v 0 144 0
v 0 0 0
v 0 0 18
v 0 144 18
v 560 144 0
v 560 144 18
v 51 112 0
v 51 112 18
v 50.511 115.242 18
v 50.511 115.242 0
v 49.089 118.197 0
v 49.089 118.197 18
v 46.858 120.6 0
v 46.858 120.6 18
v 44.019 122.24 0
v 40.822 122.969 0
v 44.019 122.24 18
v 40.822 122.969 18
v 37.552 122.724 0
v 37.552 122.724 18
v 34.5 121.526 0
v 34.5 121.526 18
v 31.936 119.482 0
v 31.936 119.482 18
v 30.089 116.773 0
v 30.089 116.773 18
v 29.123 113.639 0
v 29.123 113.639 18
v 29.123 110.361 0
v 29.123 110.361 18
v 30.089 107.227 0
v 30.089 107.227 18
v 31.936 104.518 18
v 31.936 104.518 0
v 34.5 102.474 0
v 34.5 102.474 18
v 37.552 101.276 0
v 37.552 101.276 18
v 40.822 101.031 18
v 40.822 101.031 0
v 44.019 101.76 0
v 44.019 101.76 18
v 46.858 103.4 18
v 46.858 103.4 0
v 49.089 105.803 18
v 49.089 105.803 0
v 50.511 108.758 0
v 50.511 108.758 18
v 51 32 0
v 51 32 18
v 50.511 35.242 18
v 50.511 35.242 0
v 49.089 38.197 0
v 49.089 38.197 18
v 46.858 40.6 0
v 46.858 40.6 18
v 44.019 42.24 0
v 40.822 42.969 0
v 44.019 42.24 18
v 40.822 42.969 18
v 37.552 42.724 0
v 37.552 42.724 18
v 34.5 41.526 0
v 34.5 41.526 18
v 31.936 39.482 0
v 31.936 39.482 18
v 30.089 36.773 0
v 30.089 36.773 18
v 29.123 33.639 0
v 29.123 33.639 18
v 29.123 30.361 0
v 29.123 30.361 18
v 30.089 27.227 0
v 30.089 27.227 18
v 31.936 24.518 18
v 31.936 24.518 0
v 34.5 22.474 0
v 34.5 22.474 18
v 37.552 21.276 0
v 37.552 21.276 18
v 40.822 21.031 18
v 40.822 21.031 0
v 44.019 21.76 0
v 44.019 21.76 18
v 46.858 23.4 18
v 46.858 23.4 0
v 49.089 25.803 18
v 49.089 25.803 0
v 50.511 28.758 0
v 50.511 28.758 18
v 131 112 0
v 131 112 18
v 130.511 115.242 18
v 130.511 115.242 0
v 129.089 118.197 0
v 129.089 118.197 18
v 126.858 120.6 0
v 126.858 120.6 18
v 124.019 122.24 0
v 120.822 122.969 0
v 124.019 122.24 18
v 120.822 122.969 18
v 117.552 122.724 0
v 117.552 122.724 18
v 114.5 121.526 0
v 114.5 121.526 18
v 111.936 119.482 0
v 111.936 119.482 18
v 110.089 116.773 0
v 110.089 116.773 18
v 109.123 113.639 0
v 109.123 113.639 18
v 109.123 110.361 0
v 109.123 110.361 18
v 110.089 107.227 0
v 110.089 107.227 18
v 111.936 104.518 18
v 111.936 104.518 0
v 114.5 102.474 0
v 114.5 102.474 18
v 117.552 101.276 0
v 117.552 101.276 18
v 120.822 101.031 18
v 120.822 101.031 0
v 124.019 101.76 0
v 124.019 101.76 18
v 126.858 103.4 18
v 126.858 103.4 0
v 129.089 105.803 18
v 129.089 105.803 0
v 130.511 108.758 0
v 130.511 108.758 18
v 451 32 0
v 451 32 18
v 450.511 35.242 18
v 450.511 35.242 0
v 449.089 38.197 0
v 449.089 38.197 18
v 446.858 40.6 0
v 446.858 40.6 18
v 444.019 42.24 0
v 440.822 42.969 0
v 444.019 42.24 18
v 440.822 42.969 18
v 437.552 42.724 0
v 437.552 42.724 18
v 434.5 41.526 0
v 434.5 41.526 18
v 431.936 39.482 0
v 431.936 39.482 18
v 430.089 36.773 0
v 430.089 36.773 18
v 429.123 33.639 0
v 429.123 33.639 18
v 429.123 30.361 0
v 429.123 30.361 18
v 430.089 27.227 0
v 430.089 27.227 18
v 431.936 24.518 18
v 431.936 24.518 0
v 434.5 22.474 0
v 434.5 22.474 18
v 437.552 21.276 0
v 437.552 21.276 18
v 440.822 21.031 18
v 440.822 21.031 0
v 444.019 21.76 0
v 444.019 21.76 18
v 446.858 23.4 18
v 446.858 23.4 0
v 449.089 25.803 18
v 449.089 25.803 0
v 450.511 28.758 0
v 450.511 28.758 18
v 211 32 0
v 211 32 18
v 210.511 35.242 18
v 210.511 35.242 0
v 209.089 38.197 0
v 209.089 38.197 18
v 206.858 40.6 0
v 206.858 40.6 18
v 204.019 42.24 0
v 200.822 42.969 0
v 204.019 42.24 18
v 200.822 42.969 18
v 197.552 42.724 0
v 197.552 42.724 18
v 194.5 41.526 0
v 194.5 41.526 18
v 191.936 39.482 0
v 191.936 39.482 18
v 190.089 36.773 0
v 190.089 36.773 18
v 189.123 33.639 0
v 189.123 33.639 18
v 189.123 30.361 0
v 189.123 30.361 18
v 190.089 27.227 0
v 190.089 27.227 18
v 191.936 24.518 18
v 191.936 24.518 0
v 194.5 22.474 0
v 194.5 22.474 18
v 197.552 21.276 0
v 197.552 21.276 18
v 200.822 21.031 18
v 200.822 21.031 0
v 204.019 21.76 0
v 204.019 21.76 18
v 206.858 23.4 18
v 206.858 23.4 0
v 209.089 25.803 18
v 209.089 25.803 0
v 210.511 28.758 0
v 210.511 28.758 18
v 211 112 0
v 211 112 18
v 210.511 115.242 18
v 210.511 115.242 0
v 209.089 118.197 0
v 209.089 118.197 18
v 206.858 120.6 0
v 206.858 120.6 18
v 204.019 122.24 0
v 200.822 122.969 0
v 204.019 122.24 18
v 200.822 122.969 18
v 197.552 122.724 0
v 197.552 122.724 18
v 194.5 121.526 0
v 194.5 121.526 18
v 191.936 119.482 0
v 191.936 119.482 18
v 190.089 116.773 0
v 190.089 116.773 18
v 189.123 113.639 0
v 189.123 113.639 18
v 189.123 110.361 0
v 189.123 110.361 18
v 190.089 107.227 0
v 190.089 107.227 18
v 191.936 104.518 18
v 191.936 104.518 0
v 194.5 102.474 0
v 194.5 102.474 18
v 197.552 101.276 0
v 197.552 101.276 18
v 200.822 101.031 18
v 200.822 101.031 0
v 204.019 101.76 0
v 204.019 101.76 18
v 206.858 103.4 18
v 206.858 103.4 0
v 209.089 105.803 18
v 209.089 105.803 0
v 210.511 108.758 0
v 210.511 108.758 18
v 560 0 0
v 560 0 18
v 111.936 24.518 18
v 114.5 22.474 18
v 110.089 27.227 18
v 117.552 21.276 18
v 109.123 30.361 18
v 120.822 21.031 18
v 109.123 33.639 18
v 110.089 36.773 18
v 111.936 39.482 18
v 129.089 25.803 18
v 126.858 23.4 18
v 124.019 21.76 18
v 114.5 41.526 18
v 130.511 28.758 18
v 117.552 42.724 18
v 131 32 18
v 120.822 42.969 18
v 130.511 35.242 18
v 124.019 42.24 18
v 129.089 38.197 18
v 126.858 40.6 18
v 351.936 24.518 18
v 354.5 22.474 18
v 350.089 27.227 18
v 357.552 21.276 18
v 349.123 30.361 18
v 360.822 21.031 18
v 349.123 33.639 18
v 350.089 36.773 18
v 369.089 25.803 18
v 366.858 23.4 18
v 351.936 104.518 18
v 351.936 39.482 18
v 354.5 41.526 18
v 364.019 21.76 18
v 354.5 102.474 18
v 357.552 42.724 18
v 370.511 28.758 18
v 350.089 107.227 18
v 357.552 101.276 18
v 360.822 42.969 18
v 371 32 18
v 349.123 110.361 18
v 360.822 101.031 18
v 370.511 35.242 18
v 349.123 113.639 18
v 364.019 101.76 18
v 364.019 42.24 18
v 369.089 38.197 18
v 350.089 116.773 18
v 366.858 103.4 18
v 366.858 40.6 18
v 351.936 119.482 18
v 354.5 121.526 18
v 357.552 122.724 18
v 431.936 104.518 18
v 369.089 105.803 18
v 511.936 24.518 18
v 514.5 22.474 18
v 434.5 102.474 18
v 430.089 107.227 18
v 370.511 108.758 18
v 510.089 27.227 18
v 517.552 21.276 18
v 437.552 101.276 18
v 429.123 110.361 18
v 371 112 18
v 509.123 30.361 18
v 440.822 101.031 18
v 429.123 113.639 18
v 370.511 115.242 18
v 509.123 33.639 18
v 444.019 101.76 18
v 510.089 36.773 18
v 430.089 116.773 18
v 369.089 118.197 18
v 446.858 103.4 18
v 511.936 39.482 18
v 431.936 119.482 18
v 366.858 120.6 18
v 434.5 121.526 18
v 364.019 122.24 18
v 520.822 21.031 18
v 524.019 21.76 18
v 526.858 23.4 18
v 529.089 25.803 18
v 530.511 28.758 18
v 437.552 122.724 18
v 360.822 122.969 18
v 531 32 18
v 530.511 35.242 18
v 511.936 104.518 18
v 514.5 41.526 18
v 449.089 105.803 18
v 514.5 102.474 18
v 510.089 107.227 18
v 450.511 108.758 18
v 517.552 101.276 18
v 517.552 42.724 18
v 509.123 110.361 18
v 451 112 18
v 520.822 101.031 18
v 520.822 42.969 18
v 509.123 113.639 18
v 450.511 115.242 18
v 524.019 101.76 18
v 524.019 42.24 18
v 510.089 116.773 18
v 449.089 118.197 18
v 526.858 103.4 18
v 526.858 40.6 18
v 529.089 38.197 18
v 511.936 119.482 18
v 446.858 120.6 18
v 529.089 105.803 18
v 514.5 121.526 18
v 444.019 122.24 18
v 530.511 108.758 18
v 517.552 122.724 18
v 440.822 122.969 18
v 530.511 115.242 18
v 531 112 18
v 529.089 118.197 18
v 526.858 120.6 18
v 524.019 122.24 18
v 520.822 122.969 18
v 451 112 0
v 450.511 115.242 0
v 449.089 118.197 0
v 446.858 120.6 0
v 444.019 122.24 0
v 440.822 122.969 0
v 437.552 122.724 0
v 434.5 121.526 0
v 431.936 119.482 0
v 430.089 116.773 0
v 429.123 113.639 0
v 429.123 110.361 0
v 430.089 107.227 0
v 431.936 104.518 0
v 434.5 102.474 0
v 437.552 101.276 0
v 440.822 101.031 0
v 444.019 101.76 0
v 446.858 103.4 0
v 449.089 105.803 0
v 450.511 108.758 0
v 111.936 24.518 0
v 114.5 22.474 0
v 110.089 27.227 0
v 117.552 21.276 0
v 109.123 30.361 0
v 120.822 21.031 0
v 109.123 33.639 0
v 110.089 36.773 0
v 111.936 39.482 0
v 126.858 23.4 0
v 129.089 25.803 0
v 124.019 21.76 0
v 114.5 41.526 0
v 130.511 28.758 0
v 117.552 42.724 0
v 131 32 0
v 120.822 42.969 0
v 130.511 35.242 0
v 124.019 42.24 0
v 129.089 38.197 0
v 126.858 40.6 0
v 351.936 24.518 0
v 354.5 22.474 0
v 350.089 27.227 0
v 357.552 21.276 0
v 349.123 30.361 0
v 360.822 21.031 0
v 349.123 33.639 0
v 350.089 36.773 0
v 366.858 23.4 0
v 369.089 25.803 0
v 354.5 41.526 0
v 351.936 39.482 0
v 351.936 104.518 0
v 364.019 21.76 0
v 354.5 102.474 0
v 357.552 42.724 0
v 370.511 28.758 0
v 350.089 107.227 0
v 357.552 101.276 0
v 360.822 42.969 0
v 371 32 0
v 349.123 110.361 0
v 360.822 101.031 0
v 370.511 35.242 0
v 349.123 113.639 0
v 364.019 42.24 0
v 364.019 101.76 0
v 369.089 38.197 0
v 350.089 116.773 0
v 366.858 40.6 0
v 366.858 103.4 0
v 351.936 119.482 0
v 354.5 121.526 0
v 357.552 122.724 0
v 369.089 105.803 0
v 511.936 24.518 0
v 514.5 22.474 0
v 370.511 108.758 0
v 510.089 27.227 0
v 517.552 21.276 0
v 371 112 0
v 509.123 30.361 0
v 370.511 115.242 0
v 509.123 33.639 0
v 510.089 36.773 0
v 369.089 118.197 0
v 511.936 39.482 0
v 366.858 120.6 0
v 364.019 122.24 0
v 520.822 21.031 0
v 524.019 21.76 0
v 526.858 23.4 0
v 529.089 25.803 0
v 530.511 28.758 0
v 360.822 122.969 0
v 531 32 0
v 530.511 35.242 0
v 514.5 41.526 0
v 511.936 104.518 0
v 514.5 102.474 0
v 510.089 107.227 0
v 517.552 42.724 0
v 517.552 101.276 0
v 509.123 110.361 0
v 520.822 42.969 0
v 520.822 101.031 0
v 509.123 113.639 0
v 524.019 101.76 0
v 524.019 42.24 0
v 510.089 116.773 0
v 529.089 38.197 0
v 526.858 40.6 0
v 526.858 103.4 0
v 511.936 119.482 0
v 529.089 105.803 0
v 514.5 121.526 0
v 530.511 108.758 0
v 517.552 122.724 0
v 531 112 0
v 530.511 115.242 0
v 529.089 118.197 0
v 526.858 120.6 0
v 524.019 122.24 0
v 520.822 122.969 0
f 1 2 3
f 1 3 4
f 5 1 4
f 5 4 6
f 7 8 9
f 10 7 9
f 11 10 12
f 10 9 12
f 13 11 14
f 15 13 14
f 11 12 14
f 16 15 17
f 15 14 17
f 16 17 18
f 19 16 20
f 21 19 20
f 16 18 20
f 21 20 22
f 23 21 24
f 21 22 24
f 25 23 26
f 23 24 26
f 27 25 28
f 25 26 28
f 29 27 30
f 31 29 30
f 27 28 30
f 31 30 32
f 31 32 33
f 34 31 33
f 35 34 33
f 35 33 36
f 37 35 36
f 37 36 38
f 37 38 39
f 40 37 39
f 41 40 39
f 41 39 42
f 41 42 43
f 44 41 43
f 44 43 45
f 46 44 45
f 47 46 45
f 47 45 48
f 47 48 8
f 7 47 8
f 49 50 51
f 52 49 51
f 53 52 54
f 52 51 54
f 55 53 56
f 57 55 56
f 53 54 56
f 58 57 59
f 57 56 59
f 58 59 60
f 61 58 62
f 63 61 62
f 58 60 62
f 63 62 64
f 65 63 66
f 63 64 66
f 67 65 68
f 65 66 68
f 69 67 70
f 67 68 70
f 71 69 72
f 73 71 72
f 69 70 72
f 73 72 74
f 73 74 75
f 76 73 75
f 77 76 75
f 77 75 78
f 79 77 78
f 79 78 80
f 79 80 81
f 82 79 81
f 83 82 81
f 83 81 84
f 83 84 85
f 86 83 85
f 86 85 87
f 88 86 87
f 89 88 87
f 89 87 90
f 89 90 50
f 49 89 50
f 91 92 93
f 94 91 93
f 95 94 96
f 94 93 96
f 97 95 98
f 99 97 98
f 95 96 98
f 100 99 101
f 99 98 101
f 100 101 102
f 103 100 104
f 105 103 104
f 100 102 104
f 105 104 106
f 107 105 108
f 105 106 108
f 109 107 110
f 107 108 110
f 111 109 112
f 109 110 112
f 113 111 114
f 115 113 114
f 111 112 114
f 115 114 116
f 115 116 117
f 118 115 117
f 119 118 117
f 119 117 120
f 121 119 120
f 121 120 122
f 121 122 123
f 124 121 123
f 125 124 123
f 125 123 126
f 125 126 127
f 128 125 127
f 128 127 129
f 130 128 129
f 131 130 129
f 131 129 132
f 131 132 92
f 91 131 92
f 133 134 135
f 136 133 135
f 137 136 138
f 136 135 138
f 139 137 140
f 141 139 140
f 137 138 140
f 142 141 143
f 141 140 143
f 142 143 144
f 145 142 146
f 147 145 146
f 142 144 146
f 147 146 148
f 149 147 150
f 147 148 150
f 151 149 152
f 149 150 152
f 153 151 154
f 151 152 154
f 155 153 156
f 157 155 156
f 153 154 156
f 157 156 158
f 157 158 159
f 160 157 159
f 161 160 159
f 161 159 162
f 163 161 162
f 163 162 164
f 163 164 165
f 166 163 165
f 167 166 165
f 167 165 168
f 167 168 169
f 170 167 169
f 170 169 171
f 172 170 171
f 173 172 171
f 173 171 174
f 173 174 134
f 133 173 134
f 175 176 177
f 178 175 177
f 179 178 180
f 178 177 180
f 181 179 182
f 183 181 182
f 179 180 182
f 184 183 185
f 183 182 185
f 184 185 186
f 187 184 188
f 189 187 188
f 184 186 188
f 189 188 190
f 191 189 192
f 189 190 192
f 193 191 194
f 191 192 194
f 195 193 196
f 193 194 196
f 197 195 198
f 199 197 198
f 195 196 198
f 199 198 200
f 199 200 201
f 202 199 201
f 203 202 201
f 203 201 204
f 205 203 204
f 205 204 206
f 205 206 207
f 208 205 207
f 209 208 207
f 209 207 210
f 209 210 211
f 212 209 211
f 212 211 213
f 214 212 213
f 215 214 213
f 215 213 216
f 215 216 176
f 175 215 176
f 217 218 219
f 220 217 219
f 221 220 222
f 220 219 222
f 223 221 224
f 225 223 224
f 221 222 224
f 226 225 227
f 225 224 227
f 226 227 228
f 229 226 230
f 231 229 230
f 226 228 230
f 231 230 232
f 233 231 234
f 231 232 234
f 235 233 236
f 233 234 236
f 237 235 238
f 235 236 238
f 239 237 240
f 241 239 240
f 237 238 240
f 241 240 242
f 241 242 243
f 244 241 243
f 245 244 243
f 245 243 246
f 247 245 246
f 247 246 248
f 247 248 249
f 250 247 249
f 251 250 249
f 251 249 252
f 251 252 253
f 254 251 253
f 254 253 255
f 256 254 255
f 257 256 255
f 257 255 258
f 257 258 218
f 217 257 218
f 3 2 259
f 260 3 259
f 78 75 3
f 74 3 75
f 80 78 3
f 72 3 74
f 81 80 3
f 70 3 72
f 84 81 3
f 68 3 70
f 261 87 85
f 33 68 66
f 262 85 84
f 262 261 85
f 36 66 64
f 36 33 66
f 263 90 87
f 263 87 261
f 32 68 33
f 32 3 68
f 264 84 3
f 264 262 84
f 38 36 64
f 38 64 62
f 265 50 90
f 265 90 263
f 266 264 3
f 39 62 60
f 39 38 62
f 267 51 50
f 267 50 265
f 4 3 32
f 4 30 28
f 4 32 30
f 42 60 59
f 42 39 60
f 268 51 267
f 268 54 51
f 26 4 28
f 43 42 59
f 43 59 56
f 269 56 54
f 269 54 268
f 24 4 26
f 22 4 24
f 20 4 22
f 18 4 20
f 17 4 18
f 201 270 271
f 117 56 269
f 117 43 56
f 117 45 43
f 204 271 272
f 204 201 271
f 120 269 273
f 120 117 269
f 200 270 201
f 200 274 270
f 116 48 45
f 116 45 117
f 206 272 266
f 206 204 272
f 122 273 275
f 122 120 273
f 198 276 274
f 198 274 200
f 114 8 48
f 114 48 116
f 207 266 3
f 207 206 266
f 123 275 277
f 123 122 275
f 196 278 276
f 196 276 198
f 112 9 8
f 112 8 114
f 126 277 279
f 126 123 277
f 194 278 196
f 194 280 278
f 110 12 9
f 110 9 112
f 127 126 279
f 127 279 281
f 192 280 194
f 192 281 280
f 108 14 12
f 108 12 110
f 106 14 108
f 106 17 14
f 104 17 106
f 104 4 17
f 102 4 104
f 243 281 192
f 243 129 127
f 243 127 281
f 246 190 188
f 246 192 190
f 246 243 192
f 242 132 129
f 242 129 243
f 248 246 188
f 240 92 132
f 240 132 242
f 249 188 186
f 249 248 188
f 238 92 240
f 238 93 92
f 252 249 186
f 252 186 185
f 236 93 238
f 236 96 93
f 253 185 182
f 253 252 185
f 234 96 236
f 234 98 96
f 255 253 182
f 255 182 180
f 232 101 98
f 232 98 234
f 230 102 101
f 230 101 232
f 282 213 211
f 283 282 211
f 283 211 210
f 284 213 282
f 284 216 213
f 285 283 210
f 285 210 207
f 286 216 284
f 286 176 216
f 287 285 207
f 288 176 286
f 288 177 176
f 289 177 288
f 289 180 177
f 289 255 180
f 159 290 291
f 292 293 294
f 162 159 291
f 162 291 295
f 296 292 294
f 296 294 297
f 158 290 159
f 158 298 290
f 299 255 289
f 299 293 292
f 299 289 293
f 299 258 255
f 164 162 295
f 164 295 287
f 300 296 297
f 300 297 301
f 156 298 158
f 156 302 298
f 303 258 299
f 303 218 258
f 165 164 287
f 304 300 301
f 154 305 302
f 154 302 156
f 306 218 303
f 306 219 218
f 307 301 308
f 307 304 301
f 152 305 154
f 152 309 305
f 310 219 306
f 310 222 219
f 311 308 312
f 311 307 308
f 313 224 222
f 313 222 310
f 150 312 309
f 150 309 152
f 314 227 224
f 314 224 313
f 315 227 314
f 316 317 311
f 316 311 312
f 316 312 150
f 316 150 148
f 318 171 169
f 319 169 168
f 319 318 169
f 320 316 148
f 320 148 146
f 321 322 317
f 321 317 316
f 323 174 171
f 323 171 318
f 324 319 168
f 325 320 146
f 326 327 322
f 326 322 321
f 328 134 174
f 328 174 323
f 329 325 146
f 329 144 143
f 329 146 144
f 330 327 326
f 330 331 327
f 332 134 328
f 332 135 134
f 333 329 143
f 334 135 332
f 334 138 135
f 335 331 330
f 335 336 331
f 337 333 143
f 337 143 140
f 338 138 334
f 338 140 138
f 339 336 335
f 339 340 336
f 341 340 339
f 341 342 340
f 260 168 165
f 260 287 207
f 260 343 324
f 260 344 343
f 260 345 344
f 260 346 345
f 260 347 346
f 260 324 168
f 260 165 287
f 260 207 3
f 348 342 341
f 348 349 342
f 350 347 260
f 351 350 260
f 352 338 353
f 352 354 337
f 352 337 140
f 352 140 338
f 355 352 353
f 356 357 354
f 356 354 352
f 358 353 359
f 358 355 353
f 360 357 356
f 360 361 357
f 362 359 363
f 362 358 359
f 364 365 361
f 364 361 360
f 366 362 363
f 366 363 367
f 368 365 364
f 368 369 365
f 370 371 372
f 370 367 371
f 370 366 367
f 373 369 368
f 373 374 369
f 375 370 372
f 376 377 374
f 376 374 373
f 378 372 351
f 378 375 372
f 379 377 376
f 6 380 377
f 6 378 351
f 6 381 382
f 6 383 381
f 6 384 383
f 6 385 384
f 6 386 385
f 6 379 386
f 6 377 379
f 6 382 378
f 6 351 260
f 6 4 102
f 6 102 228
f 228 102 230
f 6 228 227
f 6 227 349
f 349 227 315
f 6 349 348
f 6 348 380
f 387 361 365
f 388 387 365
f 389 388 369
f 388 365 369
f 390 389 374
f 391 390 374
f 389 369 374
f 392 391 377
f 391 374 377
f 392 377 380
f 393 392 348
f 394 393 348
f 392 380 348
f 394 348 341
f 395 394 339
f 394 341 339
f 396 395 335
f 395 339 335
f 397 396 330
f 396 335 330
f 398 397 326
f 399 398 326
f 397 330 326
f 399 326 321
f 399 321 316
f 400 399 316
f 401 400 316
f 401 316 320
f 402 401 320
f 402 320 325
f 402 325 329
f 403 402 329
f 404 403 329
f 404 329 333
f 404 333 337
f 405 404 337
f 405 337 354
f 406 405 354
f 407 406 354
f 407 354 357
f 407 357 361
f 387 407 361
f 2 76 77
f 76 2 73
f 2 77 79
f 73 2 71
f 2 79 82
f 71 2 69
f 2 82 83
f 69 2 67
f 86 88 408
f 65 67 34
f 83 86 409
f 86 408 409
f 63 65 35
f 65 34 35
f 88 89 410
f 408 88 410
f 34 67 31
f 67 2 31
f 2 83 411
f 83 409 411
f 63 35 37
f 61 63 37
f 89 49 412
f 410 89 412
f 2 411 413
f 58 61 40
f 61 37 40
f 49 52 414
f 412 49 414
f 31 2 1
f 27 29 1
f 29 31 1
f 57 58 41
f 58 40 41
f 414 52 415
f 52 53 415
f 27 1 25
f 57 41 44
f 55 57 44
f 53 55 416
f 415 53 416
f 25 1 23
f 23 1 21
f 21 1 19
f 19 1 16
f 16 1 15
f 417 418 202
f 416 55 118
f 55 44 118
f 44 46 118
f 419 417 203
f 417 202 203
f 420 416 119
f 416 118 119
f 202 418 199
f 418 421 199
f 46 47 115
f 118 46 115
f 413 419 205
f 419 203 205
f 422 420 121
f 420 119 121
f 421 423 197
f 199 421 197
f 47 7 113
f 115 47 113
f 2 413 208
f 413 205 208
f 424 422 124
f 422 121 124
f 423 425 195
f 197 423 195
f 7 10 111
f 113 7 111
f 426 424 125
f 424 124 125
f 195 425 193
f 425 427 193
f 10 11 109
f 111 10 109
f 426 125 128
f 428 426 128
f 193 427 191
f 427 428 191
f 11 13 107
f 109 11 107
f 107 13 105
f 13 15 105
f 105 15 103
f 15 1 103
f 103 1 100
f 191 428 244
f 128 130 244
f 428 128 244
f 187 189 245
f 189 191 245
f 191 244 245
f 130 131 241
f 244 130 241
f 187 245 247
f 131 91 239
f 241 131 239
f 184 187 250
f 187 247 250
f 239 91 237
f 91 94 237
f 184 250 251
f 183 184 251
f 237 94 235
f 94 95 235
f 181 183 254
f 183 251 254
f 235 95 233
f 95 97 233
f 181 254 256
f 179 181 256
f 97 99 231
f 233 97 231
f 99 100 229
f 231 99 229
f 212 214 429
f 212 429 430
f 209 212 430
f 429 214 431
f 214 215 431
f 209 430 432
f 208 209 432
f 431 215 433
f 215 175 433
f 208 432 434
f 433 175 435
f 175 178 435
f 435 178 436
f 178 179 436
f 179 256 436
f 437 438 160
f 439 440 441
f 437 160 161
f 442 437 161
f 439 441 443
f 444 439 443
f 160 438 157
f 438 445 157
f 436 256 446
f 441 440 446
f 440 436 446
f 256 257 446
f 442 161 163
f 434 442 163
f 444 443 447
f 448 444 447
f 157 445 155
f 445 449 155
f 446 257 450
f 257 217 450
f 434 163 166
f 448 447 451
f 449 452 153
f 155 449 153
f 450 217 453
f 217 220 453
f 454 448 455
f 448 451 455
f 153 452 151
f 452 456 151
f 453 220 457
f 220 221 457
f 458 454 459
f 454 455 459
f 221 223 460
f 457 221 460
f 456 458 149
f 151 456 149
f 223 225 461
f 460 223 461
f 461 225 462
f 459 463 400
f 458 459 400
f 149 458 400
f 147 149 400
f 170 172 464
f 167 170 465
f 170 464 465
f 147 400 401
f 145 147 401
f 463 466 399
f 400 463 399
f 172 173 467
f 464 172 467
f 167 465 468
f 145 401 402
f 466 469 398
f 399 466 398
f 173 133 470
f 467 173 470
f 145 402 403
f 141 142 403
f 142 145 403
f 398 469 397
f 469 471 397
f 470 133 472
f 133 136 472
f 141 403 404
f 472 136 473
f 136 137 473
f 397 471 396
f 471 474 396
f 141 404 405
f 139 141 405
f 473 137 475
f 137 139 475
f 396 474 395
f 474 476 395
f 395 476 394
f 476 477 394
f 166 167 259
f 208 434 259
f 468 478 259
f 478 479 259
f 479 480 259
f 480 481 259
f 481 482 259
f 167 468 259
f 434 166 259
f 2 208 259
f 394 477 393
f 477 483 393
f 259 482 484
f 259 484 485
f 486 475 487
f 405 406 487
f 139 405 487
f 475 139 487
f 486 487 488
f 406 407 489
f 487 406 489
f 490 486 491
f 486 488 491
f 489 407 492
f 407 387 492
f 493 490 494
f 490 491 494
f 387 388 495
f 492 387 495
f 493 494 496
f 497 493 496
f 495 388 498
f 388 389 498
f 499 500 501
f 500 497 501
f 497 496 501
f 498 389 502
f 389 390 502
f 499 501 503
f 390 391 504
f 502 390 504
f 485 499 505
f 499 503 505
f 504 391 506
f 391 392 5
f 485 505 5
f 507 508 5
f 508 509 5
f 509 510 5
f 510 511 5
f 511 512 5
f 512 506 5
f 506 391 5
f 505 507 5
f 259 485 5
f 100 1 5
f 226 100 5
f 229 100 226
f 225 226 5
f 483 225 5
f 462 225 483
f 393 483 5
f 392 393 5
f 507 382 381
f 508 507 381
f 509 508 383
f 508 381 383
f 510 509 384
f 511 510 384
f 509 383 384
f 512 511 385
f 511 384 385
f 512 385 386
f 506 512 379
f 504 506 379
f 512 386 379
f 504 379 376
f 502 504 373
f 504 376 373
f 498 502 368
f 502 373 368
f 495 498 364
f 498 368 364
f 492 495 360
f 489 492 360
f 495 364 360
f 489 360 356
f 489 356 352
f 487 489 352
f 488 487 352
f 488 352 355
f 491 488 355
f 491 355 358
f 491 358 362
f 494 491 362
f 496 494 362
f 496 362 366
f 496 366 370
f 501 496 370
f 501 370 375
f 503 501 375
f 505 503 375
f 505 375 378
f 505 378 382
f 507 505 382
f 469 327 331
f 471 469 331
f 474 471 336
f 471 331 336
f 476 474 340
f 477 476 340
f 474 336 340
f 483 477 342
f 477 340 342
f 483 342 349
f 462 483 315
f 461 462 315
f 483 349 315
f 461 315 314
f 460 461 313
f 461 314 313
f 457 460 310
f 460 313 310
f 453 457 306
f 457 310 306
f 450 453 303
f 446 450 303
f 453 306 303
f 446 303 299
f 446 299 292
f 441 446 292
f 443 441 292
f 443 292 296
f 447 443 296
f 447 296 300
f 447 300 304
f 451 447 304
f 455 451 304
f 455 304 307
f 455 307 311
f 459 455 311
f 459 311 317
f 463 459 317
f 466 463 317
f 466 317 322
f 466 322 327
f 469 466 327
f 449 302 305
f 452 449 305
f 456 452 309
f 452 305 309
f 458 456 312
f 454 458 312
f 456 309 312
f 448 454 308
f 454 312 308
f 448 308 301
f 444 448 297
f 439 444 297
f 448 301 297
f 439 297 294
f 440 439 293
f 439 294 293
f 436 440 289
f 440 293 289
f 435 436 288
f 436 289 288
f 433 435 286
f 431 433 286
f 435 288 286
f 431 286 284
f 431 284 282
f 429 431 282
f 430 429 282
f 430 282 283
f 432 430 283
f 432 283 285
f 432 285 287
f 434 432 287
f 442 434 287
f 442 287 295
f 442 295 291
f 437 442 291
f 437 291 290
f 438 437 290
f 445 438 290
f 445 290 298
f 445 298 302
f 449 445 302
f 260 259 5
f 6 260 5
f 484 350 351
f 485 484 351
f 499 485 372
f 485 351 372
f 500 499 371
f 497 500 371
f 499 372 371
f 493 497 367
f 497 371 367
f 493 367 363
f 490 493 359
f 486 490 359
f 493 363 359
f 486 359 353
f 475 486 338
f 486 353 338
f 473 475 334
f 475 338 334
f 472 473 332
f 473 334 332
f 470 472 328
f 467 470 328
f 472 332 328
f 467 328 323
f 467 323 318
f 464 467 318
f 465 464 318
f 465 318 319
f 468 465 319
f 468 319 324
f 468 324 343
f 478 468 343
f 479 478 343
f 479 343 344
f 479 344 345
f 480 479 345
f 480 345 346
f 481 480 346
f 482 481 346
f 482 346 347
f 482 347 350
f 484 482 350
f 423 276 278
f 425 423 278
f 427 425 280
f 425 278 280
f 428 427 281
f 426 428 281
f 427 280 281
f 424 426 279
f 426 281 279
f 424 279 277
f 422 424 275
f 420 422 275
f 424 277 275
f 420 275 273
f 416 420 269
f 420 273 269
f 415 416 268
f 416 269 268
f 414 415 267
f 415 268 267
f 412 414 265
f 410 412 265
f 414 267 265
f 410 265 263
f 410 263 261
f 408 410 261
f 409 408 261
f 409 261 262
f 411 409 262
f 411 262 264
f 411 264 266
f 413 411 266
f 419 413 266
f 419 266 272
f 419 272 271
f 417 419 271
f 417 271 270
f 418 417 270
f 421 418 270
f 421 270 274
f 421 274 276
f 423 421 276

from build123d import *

# Parameters (mm, degrees)
SKETCH_1_W                       = 560
SKETCH_1_H                       = 144
EXTRUDE_7_DEPTH                  = 18
SKETCH_2_R                       = 11
CUT_EXTRUDE_2_DEPTH              = 579.498055312
PATTERN_LINEAR_2_COUNT           = 2
PATTERN_LINEAR_2_PITCH           = 80
PATTERN_LINEAR_2_COUNT_DIR2      = 3
PATTERN_LINEAR_2_PITCH_DIR2      = 80
PATTERN_LINEAR_4_COUNT           = 2
PATTERN_LINEAR_4_PITCH           = 320
PATTERN_LINEAR_4_COPY_1_SKETCH_R = 11
PATTERN_LINEAR_4_COPY_1_DEPTH    = 579.498055312
PATTERN_LINEAR_4_COPY_2_SKETCH_R = 11
PATTERN_LINEAR_4_COPY_2_DEPTH    = 579.498055312
PATTERN_LINEAR_4_COPY_3_SKETCH_R = 11
PATTERN_LINEAR_4_COPY_3_DEPTH    = 579.498055312
PATTERN_LINEAR_4_COPY_4_SKETCH_R = 11
PATTERN_LINEAR_4_COPY_4_DEPTH    = 579.498055312
PATTERN_LINEAR_4_COPY_5_SKETCH_R = 11
PATTERN_LINEAR_4_COPY_5_DEPTH    = 579.498055312


with BuildPart() as part:
    # 草图1 → 拉伸7 (new body)
    with BuildSketch(Plane.XY):
        with Locations((280, 72)):
            Rectangle(SKETCH_1_W, SKETCH_1_H)
    extrude(amount=EXTRUDE_7_DEPTH)

    # 草图2 → 切除-拉伸2 (cut, through all)
    with BuildSketch(Plane.XY.offset(18)):
        with Locations((40, 112)):
            Circle(SKETCH_2_R)
    cut_extrude_2 = extrude(amount=-CUT_EXTRUDE_2_DEPTH, mode=Mode.SUBTRACT)

    # 阵列(线性)2: Cut-Extrude 2 2 × 3
    with Locations(*[(j * PATTERN_LINEAR_2_PITCH_DIR2, -i * PATTERN_LINEAR_2_PITCH, 0) for i in range(PATTERN_LINEAR_2_COUNT) for j in range(PATTERN_LINEAR_2_COUNT_DIR2) if (i, j) != (0, 0)]):
        add(cut_extrude_2, mode=Mode.SUBTRACT)

    # 阵列(线性)4: 切除-拉伸2 ×2
    with Locations(*[(i * PATTERN_LINEAR_4_PITCH, 0, 0) for i in range(1, PATTERN_LINEAR_4_COUNT)]):
        add(cut_extrude_2, mode=Mode.SUBTRACT)

    # 阵列(线性)4 copy 1 sketch → 阵列(线性)4 copy 1 (cut, through all)
    with BuildSketch(Plane(origin=(400, 0, 18), x_dir=(1, 0, 0), z_dir=(0, 0, 1))):
        with Locations((40, 112)):
            Circle(PATTERN_LINEAR_4_COPY_1_SKETCH_R)
    extrude(amount=-PATTERN_LINEAR_4_COPY_1_DEPTH, mode=Mode.SUBTRACT)

    # 阵列(线性)4 copy 2 sketch → 阵列(线性)4 copy 2 (cut, through all)
    with BuildSketch(Plane(origin=(480, 0, 18), x_dir=(1, 0, 0), z_dir=(0, 0, 1))):
        with Locations((40, 112)):
            Circle(PATTERN_LINEAR_4_COPY_2_SKETCH_R)
    extrude(amount=-PATTERN_LINEAR_4_COPY_2_DEPTH, mode=Mode.SUBTRACT)

    # 阵列(线性)4 copy 3 sketch → 阵列(线性)4 copy 3 (cut, through all)
    with BuildSketch(Plane(origin=(320, -80, 18), x_dir=(1, 0, 0), z_dir=(0, 0, 1))):
        with Locations((40, 112)):
            Circle(PATTERN_LINEAR_4_COPY_3_SKETCH_R)
    extrude(amount=-PATTERN_LINEAR_4_COPY_3_DEPTH, mode=Mode.SUBTRACT)

    # 阵列(线性)4 copy 4 sketch → 阵列(线性)4 copy 4 (cut, through all)
    with BuildSketch(Plane(origin=(400, -80, 18), x_dir=(1, 0, 0), z_dir=(0, 0, 1))):
        with Locations((40, 112)):
            Circle(PATTERN_LINEAR_4_COPY_4_SKETCH_R)
    extrude(amount=-PATTERN_LINEAR_4_COPY_4_DEPTH, mode=Mode.SUBTRACT)

    # 阵列(线性)4 copy 5 sketch → 阵列(线性)4 copy 5 (cut, through all)
    with BuildSketch(Plane(origin=(480, -80, 18), x_dir=(1, 0, 0), z_dir=(0, 0, 1))):
        with Locations((40, 112)):
            Circle(PATTERN_LINEAR_4_COPY_5_SKETCH_R)
    extrude(amount=-PATTERN_LINEAR_4_COPY_5_DEPTH, mode=Mode.SUBTRACT)


solid = part.part
